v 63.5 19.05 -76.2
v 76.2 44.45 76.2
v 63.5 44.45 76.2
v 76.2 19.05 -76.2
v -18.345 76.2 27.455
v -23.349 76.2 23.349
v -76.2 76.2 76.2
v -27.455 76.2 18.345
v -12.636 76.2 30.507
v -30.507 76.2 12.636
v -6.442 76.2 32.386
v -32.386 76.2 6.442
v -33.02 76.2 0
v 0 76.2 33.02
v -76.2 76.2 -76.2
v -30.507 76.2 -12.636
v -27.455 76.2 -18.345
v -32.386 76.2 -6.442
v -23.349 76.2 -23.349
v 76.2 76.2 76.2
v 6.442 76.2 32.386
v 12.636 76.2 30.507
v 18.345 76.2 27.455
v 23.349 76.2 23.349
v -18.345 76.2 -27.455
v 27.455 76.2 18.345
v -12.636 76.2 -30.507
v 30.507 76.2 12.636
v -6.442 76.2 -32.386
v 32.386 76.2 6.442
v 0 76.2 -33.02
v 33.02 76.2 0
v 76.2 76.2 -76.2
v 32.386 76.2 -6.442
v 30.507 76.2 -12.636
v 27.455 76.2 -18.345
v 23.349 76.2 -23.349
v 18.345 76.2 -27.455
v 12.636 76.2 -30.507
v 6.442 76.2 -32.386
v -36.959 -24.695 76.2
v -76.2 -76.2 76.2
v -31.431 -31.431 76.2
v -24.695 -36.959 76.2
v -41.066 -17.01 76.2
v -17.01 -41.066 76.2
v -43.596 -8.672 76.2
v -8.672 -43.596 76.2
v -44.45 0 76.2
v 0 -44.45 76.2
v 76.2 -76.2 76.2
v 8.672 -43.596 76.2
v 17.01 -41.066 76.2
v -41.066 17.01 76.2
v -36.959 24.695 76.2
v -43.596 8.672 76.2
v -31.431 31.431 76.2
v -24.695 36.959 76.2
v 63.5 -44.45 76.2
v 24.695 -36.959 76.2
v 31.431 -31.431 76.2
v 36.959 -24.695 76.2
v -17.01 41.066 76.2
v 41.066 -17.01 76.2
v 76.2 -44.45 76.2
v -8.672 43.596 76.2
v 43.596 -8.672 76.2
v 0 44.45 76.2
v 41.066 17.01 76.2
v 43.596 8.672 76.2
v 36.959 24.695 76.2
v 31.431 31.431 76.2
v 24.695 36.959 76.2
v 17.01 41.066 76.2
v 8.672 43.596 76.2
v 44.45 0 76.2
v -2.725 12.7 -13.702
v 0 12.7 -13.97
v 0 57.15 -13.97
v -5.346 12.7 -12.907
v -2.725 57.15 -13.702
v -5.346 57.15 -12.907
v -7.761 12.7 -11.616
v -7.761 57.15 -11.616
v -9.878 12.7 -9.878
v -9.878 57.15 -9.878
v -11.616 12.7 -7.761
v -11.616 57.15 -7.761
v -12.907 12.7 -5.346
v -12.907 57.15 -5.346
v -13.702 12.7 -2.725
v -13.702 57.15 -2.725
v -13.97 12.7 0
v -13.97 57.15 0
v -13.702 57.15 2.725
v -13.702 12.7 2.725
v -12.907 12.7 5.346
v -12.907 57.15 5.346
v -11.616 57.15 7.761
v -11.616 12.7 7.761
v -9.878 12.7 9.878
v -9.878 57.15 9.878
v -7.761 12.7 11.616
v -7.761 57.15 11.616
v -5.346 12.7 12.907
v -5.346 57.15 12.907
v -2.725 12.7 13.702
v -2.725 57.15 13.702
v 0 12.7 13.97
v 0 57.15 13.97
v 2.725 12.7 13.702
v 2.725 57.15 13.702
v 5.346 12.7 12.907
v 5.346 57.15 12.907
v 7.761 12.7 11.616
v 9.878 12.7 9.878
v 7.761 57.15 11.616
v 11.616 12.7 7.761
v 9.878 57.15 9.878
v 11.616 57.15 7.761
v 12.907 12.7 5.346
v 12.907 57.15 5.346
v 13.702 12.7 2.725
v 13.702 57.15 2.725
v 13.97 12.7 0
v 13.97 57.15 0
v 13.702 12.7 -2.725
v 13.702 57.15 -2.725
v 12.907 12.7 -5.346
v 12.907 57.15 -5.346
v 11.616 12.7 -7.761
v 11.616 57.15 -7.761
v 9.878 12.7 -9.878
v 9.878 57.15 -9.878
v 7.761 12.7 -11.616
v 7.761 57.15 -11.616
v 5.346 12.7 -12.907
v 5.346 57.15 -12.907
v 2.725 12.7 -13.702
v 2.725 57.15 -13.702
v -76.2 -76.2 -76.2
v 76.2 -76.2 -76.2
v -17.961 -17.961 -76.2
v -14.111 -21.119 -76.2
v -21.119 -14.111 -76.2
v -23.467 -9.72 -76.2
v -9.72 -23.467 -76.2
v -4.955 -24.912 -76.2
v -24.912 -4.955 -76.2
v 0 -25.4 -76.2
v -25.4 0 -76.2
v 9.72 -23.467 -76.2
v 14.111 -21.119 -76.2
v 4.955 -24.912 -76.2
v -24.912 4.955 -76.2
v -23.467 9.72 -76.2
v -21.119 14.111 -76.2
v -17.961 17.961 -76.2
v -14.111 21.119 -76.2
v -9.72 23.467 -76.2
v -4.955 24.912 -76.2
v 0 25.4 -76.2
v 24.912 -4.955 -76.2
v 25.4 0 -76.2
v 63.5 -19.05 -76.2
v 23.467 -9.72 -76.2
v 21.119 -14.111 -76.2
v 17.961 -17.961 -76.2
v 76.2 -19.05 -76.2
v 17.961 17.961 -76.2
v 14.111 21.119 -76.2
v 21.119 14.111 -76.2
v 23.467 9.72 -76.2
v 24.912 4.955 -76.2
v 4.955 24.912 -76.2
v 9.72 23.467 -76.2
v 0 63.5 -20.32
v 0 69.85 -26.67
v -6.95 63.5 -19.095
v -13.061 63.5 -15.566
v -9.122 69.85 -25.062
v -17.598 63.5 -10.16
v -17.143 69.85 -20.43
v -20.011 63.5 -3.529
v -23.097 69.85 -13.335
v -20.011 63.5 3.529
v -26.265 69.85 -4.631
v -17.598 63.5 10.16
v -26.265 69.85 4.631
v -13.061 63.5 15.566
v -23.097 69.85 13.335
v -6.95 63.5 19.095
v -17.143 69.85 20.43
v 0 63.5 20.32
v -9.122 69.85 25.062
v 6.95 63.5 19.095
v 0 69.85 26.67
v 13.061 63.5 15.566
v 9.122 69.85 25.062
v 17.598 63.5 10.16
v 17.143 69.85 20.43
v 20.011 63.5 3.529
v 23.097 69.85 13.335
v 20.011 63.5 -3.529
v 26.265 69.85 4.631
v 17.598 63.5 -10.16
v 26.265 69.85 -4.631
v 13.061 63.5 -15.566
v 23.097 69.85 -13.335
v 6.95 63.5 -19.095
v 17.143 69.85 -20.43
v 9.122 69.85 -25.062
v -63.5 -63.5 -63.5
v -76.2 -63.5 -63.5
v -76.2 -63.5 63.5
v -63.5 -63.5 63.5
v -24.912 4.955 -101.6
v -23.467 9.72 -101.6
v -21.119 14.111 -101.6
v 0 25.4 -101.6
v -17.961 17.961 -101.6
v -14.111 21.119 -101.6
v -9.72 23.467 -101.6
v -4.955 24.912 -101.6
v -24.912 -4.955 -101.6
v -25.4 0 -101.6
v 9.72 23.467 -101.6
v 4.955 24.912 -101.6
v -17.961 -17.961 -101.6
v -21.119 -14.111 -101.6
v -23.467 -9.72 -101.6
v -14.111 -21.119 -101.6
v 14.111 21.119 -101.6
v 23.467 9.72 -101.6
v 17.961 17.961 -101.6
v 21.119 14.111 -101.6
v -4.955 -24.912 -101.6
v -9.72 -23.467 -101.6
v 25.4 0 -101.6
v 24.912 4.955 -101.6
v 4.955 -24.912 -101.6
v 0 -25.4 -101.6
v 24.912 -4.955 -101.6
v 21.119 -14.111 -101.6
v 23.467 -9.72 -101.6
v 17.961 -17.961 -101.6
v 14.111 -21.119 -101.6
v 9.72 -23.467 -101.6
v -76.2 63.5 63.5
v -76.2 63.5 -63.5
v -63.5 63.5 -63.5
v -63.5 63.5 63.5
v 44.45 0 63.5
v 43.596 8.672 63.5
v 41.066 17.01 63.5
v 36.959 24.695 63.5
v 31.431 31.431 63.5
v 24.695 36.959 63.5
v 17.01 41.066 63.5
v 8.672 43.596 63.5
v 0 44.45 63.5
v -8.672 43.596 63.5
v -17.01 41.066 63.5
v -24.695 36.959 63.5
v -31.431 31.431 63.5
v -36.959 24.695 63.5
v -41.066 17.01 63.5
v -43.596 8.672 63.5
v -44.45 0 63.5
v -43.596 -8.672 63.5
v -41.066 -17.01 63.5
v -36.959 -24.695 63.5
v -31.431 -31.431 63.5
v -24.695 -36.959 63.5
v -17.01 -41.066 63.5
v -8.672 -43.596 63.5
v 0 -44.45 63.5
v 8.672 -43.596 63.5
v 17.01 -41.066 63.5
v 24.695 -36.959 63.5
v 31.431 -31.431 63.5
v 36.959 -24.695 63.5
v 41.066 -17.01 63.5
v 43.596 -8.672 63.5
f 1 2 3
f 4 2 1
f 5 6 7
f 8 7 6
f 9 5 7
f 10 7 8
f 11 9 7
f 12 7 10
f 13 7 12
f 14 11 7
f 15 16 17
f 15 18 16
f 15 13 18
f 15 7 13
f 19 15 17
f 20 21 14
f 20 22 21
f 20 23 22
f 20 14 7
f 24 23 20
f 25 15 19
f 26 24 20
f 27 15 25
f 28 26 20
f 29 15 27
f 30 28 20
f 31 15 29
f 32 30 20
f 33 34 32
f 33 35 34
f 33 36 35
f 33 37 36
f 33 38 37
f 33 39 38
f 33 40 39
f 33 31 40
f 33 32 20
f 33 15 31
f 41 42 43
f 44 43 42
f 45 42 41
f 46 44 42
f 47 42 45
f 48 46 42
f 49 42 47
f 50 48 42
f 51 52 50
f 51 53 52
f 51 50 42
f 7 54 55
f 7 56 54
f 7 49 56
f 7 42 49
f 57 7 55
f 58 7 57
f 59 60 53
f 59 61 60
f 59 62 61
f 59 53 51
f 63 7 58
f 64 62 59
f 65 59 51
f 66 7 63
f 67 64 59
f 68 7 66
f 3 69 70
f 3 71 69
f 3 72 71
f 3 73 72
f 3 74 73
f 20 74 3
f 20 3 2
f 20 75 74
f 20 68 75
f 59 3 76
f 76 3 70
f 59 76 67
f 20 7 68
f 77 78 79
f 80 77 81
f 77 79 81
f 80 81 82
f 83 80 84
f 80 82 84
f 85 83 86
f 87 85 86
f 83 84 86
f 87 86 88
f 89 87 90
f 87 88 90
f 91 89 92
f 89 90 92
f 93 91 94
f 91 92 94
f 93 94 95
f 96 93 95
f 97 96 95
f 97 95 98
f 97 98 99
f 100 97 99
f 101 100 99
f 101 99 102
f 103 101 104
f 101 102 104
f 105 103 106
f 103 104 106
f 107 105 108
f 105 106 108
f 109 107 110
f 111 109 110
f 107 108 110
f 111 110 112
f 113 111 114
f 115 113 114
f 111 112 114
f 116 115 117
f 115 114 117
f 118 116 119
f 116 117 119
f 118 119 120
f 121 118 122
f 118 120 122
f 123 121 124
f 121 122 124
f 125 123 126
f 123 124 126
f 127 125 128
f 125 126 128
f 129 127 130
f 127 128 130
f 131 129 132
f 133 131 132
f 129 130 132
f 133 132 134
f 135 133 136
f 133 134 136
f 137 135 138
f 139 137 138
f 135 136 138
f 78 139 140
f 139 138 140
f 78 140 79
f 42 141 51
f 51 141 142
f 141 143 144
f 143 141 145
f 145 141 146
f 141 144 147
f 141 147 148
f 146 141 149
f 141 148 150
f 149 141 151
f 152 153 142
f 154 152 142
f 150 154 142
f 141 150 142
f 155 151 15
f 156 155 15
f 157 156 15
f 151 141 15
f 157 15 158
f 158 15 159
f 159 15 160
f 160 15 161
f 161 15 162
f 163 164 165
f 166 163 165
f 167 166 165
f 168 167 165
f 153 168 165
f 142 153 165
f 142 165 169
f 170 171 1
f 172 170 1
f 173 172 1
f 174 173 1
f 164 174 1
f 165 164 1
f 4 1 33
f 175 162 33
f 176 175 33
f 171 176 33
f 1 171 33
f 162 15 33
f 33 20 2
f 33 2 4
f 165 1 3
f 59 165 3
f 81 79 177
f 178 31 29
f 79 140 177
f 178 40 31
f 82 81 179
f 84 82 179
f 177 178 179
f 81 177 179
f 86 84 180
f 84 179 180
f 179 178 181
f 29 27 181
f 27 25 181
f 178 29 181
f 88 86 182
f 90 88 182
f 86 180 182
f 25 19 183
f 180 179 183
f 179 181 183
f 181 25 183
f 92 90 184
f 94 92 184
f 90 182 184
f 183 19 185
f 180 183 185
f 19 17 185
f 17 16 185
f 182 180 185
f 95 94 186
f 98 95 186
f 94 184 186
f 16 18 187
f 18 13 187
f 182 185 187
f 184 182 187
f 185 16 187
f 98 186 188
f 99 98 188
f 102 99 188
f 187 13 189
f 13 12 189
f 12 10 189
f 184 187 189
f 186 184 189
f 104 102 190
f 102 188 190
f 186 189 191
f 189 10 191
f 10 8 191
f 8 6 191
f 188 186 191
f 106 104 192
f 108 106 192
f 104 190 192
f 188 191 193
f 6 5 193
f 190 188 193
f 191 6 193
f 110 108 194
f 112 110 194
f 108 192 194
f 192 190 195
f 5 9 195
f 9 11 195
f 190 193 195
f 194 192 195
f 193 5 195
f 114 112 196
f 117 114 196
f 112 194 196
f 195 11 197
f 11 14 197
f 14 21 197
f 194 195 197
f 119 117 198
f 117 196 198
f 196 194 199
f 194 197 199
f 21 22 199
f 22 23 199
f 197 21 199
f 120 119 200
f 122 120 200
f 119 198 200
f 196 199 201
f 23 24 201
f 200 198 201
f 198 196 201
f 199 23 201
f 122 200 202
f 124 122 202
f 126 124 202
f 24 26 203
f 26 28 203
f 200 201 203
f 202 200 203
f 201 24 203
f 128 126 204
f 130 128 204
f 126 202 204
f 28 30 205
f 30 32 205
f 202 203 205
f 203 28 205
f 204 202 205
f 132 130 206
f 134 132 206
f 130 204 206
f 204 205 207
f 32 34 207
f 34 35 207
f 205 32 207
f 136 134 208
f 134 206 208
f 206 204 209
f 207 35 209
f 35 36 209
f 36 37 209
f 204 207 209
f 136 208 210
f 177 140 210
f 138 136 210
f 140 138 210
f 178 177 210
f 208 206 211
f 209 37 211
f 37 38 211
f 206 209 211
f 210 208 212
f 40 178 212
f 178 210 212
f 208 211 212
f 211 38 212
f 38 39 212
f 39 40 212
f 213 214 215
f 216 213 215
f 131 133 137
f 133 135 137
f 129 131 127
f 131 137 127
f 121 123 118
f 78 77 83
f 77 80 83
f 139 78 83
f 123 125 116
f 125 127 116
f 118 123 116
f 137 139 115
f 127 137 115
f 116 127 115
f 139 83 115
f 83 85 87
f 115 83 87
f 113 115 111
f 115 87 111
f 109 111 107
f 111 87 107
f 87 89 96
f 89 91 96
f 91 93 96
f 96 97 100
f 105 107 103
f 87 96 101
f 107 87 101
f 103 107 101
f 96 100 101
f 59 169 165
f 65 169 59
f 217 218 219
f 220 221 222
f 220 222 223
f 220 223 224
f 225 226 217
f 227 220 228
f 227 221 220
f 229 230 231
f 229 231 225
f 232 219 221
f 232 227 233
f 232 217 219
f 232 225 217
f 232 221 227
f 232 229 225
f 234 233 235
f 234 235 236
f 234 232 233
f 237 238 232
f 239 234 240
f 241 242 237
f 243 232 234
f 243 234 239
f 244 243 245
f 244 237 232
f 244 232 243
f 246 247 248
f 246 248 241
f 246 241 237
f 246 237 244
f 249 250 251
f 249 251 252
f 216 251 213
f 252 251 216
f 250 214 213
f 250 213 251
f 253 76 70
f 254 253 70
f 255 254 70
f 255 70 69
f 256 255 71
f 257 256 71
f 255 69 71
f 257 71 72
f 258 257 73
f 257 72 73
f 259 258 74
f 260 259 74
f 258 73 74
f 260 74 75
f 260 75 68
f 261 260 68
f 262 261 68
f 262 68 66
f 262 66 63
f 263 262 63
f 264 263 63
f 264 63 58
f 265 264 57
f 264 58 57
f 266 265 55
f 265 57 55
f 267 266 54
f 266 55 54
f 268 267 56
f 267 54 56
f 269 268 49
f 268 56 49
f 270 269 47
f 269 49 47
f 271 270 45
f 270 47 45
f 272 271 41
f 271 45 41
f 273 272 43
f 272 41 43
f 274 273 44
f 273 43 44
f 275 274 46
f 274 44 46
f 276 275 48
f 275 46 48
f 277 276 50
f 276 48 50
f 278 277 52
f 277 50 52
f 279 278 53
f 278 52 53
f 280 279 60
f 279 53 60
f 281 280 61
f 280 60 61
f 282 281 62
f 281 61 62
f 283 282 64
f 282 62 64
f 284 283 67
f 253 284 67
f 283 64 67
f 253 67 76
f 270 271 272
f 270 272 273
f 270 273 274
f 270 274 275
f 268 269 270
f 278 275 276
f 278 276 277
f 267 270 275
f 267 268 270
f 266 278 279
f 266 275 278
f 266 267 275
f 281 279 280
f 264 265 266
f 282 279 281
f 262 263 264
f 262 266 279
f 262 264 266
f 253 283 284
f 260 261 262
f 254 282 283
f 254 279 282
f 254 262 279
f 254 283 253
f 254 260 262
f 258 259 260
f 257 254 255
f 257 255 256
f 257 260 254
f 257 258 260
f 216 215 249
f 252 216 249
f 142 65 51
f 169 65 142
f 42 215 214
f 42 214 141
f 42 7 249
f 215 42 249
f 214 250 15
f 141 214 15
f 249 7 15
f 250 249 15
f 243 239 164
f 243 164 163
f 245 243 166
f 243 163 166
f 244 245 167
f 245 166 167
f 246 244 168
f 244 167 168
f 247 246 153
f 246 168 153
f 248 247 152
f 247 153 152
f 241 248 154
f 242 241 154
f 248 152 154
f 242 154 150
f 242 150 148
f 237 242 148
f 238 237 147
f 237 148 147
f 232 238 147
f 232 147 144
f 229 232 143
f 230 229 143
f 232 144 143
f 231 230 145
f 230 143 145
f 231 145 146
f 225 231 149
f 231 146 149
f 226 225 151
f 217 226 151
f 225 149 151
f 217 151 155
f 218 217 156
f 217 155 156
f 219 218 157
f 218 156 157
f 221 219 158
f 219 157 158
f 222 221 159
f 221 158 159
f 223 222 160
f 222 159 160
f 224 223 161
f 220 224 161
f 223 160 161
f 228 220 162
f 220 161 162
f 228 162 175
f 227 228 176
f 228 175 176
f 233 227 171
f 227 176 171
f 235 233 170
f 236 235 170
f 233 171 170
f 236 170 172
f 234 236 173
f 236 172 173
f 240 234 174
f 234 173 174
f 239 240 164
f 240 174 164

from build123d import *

# Parameters (mm, degrees)
SKETCH1_W           = 152.4
SKETCH1_H           = 152.4
BOSS_EXTRUDE1_DEPTH = 76.2
CUT_EXTRUDE1_DEPTH  = 12.7
SKETCH4_R           = 44.45
CUT_EXTRUDE2_DEPTH  = 12.7
SKETCH5_R           = 25.4
BOSS_EXTRUDE2_DEPTH = 25.4
SKETCH6_W           = 127
SKETCH6_H           = 127
CUT_EXTRUDE3_DEPTH  = 12.7


with BuildPart() as part:
    # Sketch1 → Boss-Extrude1 (new, symmetric)
    with BuildSketch(Plane(origin=(0, 0, 0), x_dir=(1, 0, 0), z_dir=(0, 1, 0))):
        Rectangle(SKETCH1_W, SKETCH1_H)
    extrude(amount=BOSS_EXTRUDE1_DEPTH, both=True)

    # Sketch2 → Cut-Revolve1 (revolve, cut)
    with BuildSketch(Plane.XY, mode=Mode.PRIVATE) as cut_revolve1_sk:
        Polygon((0, 12.7), (13.97, 12.7), (13.97, 57.15), (33.02, 76.2), (0, 76.2), align=None)
    revolve(cut_revolve1_sk.sketch.rotate(Axis((0, 0, 0), (0, 1, 0)), 90), axis=Axis((0, 0, 0), (0, 1, 0)), mode=Mode.SUBTRACT)

    # Sketch3 → Cut-Extrude1 (cut)
    with BuildSketch(Plane(origin=(76.2, 0, 0), x_dir=(0, 0, -1), z_dir=(1, 0, 0))):
        Polygon((-76.2, 44.45), (76.2, 19.05), (76.2, -19.05), (-76.2, -44.45), align=None)
    extrude(amount=-CUT_EXTRUDE1_DEPTH, mode=Mode.SUBTRACT)

    # Sketch4 → Cut-Extrude2 (cut)
    with BuildSketch(Plane.XY.offset(76.2)):
        Circle(SKETCH4_R)
    extrude(amount=-CUT_EXTRUDE2_DEPTH, mode=Mode.SUBTRACT)

    # Sketch5 → Boss-Extrude2 (add)
    with BuildSketch(Plane(origin=(0, 0, -76.2), x_dir=(-1, 0, 0), z_dir=(0, 0, -1))):
        with Locations(Location((0, 0, 0), (0, 0, 180))):
            Circle(SKETCH5_R)
    extrude(amount=BOSS_EXTRUDE2_DEPTH)

    # Sketch6 → Cut-Extrude3 (cut)
    with BuildSketch(Plane.ZY.offset(76.2)):
        Rectangle(SKETCH6_W, SKETCH6_H)
    extrude(amount=-CUT_EXTRUDE3_DEPTH, mode=Mode.SUBTRACT)


solid = part.part
